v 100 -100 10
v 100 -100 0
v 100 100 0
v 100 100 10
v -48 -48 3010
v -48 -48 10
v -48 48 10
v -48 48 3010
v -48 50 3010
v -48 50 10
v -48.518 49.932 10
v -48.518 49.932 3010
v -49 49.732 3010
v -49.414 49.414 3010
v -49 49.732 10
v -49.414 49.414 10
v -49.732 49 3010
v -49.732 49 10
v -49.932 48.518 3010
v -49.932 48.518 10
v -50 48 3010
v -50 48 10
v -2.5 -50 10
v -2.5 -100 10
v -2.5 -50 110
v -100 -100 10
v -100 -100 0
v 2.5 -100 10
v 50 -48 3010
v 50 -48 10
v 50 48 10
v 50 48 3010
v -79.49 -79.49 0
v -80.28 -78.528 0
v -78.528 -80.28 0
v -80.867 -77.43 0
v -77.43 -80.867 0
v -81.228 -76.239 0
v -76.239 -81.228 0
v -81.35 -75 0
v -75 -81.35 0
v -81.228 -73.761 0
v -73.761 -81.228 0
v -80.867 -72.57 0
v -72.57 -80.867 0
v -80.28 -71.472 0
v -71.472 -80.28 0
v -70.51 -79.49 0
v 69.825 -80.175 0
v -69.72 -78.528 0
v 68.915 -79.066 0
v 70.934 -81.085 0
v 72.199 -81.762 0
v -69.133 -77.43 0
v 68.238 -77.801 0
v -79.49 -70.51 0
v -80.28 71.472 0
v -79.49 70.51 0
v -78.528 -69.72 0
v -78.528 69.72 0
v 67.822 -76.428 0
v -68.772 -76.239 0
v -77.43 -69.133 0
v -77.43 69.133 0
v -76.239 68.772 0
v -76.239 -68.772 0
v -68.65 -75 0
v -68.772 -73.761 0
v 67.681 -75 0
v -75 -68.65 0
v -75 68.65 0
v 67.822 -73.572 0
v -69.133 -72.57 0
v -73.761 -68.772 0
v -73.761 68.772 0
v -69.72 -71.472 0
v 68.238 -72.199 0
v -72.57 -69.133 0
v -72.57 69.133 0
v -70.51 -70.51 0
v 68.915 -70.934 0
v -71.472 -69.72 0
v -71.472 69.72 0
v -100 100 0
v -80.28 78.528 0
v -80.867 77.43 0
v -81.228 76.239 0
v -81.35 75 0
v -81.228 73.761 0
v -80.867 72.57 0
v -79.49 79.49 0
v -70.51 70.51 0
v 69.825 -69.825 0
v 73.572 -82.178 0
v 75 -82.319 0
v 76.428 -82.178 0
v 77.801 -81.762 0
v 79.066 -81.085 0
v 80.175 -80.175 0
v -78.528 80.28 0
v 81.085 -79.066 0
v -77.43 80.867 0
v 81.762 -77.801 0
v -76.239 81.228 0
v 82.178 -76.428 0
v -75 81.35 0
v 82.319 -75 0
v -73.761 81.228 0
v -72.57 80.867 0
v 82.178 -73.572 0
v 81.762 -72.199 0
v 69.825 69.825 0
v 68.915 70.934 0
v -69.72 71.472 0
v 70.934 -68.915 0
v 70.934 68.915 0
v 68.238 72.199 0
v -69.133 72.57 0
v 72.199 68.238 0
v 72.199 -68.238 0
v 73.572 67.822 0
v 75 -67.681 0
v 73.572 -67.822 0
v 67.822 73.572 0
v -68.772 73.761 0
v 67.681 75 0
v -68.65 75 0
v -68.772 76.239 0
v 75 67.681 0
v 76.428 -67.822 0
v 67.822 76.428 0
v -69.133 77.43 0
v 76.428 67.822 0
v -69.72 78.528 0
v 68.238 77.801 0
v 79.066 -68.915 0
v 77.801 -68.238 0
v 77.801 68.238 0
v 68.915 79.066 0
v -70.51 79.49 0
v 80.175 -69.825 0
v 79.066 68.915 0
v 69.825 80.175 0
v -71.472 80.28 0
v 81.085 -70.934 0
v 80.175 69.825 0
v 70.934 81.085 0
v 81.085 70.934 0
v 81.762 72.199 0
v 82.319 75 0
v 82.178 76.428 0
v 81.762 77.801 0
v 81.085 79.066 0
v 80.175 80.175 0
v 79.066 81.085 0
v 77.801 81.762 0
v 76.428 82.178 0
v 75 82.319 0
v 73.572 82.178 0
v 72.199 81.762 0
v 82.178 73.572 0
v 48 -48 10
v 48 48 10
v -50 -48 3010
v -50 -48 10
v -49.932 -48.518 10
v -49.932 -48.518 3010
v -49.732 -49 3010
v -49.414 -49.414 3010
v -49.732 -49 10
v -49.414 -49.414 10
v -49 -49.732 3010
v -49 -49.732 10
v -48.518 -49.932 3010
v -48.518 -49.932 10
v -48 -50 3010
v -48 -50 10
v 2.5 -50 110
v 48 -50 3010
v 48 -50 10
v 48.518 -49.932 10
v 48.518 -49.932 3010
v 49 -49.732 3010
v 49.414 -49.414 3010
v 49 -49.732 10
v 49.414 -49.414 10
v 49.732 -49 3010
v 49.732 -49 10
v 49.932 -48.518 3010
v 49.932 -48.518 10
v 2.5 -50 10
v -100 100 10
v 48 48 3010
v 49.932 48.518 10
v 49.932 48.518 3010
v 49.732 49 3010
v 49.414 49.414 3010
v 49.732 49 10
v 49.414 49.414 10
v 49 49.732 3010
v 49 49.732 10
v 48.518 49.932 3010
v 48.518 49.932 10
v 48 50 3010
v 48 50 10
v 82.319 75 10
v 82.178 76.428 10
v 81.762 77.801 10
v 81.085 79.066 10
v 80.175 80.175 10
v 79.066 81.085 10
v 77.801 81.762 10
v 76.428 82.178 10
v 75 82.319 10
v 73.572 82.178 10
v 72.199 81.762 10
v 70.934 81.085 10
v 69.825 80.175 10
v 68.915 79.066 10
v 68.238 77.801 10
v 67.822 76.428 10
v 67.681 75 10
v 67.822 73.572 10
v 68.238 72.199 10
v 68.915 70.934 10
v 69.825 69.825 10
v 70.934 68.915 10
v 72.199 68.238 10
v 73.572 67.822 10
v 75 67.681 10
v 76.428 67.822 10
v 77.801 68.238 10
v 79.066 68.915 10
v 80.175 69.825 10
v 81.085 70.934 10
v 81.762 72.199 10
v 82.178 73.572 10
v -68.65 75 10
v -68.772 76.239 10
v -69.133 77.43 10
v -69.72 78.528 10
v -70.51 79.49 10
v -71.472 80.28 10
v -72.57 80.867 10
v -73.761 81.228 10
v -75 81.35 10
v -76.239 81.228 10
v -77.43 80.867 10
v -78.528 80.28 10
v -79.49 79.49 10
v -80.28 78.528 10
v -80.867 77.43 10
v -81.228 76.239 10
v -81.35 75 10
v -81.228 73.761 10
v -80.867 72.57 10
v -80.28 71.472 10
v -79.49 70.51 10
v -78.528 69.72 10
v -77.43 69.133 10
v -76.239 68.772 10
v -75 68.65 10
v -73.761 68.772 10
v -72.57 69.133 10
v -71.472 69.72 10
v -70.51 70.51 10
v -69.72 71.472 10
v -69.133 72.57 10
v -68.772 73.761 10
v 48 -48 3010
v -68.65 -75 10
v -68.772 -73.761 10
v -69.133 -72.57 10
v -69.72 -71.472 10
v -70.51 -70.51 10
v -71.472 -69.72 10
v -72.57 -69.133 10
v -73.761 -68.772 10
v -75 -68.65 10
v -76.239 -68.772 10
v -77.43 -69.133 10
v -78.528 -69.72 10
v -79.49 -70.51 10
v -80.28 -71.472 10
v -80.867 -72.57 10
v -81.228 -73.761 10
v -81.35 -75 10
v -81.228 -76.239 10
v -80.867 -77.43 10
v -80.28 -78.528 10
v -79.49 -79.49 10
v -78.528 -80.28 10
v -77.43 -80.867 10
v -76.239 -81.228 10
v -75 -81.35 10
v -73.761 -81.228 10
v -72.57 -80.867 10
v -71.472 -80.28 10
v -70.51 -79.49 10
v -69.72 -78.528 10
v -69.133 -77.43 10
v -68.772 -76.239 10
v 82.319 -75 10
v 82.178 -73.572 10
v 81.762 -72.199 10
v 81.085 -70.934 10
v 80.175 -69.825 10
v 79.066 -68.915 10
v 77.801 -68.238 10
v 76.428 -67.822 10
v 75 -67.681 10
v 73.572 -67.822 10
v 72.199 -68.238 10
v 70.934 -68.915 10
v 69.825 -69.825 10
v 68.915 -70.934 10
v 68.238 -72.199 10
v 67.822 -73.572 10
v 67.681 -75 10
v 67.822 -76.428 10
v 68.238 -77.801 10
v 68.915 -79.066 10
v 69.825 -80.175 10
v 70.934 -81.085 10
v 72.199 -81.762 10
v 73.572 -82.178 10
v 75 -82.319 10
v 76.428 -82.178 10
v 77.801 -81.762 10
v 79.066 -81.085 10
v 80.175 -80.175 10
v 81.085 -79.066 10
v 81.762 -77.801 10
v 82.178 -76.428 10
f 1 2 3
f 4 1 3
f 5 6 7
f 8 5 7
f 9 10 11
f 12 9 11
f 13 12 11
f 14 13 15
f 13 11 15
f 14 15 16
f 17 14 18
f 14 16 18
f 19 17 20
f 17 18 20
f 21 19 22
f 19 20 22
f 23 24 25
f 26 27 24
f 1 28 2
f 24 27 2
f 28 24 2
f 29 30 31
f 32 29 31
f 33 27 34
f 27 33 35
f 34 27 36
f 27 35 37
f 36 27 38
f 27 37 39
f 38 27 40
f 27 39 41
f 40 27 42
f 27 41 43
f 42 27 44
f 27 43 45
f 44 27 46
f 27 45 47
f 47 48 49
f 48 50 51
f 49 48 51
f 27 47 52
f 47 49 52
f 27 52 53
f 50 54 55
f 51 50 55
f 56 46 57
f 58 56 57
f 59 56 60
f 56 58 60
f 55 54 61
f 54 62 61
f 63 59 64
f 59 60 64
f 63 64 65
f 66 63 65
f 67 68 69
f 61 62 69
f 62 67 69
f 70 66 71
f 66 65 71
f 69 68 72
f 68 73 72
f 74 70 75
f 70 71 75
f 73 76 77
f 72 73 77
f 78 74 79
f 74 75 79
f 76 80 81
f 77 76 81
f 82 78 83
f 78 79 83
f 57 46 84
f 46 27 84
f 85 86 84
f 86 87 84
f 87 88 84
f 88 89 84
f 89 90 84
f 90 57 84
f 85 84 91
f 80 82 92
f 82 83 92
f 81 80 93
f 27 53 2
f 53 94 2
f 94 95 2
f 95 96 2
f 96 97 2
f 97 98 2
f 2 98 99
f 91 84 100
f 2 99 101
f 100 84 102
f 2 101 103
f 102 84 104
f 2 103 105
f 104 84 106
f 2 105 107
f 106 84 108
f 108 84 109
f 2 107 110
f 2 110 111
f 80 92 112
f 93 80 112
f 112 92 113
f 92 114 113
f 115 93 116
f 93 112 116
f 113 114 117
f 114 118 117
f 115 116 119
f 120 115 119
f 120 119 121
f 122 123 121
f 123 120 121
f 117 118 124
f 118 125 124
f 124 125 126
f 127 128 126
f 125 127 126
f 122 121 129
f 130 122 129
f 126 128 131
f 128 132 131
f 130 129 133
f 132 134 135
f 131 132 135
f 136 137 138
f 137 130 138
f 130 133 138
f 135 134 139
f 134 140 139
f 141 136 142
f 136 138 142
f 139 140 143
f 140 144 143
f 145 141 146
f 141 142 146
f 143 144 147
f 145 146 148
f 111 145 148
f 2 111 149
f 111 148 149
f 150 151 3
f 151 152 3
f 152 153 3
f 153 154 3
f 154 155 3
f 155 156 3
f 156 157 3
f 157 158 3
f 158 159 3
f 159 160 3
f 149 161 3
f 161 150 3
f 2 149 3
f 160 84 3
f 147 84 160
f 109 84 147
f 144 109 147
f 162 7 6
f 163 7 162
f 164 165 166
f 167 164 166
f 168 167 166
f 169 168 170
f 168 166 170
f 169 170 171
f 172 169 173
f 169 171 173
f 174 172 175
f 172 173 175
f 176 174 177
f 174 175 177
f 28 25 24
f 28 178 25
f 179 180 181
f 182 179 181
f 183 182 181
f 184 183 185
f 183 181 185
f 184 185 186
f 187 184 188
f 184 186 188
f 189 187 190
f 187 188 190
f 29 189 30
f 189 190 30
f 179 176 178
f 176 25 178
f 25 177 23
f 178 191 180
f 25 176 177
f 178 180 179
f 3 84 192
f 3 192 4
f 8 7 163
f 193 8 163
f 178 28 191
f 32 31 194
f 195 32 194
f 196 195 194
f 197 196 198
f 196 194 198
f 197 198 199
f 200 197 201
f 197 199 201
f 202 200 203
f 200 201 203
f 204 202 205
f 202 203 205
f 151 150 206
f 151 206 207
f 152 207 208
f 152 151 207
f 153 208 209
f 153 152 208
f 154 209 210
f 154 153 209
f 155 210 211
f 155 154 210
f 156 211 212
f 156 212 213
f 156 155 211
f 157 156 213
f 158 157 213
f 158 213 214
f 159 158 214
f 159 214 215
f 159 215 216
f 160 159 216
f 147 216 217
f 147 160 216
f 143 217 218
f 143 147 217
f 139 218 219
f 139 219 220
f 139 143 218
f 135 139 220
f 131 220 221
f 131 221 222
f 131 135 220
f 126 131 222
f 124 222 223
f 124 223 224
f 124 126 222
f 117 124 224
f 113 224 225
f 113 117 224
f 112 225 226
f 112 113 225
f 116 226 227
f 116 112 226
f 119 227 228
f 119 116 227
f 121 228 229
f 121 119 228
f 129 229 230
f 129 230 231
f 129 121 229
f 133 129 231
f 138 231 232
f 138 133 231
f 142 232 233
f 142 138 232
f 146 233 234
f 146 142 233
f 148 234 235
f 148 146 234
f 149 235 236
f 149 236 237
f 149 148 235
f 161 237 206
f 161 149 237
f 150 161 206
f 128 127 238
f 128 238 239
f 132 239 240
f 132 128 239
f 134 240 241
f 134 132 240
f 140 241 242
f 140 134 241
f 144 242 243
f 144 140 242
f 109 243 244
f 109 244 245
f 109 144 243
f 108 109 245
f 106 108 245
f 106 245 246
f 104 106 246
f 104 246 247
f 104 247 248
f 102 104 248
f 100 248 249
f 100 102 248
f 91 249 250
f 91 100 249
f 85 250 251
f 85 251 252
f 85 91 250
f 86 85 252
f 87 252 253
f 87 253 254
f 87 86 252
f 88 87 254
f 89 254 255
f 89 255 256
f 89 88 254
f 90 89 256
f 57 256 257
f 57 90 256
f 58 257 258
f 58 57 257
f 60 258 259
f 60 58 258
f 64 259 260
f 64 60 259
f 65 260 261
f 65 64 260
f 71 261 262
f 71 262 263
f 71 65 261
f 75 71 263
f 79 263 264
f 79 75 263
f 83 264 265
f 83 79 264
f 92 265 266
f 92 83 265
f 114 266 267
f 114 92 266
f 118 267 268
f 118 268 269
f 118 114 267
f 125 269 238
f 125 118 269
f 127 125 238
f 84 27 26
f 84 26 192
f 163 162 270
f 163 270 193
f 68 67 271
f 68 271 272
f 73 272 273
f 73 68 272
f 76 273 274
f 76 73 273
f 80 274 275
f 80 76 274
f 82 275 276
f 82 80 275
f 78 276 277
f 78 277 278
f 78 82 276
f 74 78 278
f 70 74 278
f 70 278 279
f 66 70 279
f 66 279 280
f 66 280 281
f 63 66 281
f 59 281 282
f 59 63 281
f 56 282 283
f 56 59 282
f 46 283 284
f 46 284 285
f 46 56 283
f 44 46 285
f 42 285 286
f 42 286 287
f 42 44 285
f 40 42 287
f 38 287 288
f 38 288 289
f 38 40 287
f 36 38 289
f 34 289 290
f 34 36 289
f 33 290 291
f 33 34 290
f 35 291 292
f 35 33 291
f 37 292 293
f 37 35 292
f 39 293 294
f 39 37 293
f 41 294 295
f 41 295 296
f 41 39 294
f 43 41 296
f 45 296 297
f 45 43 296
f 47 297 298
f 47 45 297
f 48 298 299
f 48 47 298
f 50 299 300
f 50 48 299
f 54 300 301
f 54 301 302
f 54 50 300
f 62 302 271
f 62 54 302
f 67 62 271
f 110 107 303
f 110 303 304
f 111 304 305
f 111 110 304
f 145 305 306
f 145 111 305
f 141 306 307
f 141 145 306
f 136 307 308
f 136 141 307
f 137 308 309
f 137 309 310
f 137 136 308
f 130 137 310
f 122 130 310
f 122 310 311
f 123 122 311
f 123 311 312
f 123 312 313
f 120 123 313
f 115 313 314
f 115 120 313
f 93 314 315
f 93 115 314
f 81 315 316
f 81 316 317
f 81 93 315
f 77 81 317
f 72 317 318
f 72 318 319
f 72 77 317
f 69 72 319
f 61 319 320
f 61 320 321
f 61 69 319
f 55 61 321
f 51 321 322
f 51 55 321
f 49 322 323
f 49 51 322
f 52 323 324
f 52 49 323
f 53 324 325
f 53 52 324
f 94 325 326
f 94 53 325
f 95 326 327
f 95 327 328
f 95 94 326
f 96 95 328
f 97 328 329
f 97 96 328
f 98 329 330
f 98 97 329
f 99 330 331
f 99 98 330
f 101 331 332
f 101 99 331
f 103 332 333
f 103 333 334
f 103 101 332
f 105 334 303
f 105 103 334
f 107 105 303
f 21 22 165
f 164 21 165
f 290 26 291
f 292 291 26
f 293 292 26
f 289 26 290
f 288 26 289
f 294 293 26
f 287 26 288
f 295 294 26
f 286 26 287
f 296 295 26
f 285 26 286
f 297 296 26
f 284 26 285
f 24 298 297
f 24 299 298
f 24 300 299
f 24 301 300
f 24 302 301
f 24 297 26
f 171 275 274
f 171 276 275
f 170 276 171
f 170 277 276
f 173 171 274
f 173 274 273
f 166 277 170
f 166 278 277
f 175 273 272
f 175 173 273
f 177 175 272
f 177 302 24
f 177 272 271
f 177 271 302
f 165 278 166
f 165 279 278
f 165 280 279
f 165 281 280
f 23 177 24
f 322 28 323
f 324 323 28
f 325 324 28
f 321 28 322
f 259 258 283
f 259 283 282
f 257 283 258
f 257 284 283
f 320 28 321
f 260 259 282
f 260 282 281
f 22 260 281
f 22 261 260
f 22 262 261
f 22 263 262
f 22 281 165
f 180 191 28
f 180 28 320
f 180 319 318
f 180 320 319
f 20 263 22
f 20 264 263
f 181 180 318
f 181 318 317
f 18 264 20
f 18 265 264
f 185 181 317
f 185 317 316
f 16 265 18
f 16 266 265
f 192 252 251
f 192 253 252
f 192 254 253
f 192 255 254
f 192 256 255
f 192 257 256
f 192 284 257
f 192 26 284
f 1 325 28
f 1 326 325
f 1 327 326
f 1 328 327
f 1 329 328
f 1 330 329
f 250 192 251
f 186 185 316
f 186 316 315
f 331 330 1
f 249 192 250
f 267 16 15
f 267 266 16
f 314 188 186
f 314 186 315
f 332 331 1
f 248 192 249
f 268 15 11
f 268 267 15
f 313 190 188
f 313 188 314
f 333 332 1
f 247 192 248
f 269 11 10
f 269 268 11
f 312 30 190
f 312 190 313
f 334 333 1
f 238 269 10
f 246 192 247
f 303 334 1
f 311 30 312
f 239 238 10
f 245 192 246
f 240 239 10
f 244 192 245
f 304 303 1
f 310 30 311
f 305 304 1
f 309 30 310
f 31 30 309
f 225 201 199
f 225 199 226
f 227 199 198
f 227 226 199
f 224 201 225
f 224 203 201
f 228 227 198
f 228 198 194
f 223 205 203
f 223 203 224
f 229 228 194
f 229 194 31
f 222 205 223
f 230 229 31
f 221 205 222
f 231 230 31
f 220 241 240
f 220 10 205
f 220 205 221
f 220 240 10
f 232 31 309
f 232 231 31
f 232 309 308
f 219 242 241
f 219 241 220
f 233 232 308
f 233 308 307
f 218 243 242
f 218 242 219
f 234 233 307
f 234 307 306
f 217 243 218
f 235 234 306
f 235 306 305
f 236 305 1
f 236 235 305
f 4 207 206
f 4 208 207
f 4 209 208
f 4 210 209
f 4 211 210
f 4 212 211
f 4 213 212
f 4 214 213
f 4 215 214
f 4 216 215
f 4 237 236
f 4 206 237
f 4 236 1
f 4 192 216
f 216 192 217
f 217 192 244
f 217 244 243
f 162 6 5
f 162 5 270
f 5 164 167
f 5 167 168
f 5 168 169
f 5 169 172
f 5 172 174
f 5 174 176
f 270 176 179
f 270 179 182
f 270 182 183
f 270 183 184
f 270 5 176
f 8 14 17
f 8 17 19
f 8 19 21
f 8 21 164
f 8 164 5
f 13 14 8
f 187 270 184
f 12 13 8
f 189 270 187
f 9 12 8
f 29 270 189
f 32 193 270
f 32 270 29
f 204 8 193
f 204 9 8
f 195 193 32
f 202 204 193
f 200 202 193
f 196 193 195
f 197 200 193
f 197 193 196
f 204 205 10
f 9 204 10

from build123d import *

# Parameters (mm, degrees)
F0_W          = 200
F0_H          = 200
F0_R          = 6.35
F0_R_2        = 7.318903
F1_DEPTH      = 10
F2_W          = 96
F2_H          = 96
F3_DEPTH      = 3000
F5_DEPTH      = 2.5
F5_DEPTH_BACK = 2.5


with BuildPart() as f1:
    # F0 (on Top) → F1 (new body)
    with BuildSketch(Plane.XY):
        Rectangle(F0_W, F0_H)
        with Locations((-75, -75)):
            Circle(F0_R, mode=Mode.SUBTRACT)
        with Locations((75, -75)):
            Circle(F0_R_2, mode=Mode.SUBTRACT)
        with Locations((-75, 75)):
            Circle(F0_R, mode=Mode.SUBTRACT)
        with Locations((75, 75)):
            Circle(F0_R_2, mode=Mode.SUBTRACT)
    extrude(amount=F1_DEPTH)

    # F2 (on face) → F3 (join)
    with BuildSketch(Plane.XY.offset(10)):
        with BuildLine():
            ThreePointArc((50, 48), (49.414214, 49.414214), (48, 50))
            Line((48, 50), (-48, 50))
            ThreePointArc((-48, 50), (-49.414214, 49.414214), (-50, 48))
            Line((-50, 48), (-50, -48))
            ThreePointArc((-50, -48), (-49.414214, -49.414214), (-48, -50))
            Line((-48, -50), (48, -50))
            ThreePointArc((48, -50), (49.414214, -49.414214), (50, -48))
            Line((50, -48), (50, 48))
        make_face()
        Rectangle(F2_W, F2_H, mode=Mode.SUBTRACT)
    extrude(amount=F3_DEPTH)

    # F4 (on Right) → F5 (join, two sides)
    with BuildSketch(Plane.YZ) as f5_sk:
        Polygon((-50, 110), (-100, 10), (-50, 10), align=None)
    extrude(amount=F5_DEPTH)
    extrude(f5_sk.sketch, amount=-F5_DEPTH_BACK)


solid = f1.part
